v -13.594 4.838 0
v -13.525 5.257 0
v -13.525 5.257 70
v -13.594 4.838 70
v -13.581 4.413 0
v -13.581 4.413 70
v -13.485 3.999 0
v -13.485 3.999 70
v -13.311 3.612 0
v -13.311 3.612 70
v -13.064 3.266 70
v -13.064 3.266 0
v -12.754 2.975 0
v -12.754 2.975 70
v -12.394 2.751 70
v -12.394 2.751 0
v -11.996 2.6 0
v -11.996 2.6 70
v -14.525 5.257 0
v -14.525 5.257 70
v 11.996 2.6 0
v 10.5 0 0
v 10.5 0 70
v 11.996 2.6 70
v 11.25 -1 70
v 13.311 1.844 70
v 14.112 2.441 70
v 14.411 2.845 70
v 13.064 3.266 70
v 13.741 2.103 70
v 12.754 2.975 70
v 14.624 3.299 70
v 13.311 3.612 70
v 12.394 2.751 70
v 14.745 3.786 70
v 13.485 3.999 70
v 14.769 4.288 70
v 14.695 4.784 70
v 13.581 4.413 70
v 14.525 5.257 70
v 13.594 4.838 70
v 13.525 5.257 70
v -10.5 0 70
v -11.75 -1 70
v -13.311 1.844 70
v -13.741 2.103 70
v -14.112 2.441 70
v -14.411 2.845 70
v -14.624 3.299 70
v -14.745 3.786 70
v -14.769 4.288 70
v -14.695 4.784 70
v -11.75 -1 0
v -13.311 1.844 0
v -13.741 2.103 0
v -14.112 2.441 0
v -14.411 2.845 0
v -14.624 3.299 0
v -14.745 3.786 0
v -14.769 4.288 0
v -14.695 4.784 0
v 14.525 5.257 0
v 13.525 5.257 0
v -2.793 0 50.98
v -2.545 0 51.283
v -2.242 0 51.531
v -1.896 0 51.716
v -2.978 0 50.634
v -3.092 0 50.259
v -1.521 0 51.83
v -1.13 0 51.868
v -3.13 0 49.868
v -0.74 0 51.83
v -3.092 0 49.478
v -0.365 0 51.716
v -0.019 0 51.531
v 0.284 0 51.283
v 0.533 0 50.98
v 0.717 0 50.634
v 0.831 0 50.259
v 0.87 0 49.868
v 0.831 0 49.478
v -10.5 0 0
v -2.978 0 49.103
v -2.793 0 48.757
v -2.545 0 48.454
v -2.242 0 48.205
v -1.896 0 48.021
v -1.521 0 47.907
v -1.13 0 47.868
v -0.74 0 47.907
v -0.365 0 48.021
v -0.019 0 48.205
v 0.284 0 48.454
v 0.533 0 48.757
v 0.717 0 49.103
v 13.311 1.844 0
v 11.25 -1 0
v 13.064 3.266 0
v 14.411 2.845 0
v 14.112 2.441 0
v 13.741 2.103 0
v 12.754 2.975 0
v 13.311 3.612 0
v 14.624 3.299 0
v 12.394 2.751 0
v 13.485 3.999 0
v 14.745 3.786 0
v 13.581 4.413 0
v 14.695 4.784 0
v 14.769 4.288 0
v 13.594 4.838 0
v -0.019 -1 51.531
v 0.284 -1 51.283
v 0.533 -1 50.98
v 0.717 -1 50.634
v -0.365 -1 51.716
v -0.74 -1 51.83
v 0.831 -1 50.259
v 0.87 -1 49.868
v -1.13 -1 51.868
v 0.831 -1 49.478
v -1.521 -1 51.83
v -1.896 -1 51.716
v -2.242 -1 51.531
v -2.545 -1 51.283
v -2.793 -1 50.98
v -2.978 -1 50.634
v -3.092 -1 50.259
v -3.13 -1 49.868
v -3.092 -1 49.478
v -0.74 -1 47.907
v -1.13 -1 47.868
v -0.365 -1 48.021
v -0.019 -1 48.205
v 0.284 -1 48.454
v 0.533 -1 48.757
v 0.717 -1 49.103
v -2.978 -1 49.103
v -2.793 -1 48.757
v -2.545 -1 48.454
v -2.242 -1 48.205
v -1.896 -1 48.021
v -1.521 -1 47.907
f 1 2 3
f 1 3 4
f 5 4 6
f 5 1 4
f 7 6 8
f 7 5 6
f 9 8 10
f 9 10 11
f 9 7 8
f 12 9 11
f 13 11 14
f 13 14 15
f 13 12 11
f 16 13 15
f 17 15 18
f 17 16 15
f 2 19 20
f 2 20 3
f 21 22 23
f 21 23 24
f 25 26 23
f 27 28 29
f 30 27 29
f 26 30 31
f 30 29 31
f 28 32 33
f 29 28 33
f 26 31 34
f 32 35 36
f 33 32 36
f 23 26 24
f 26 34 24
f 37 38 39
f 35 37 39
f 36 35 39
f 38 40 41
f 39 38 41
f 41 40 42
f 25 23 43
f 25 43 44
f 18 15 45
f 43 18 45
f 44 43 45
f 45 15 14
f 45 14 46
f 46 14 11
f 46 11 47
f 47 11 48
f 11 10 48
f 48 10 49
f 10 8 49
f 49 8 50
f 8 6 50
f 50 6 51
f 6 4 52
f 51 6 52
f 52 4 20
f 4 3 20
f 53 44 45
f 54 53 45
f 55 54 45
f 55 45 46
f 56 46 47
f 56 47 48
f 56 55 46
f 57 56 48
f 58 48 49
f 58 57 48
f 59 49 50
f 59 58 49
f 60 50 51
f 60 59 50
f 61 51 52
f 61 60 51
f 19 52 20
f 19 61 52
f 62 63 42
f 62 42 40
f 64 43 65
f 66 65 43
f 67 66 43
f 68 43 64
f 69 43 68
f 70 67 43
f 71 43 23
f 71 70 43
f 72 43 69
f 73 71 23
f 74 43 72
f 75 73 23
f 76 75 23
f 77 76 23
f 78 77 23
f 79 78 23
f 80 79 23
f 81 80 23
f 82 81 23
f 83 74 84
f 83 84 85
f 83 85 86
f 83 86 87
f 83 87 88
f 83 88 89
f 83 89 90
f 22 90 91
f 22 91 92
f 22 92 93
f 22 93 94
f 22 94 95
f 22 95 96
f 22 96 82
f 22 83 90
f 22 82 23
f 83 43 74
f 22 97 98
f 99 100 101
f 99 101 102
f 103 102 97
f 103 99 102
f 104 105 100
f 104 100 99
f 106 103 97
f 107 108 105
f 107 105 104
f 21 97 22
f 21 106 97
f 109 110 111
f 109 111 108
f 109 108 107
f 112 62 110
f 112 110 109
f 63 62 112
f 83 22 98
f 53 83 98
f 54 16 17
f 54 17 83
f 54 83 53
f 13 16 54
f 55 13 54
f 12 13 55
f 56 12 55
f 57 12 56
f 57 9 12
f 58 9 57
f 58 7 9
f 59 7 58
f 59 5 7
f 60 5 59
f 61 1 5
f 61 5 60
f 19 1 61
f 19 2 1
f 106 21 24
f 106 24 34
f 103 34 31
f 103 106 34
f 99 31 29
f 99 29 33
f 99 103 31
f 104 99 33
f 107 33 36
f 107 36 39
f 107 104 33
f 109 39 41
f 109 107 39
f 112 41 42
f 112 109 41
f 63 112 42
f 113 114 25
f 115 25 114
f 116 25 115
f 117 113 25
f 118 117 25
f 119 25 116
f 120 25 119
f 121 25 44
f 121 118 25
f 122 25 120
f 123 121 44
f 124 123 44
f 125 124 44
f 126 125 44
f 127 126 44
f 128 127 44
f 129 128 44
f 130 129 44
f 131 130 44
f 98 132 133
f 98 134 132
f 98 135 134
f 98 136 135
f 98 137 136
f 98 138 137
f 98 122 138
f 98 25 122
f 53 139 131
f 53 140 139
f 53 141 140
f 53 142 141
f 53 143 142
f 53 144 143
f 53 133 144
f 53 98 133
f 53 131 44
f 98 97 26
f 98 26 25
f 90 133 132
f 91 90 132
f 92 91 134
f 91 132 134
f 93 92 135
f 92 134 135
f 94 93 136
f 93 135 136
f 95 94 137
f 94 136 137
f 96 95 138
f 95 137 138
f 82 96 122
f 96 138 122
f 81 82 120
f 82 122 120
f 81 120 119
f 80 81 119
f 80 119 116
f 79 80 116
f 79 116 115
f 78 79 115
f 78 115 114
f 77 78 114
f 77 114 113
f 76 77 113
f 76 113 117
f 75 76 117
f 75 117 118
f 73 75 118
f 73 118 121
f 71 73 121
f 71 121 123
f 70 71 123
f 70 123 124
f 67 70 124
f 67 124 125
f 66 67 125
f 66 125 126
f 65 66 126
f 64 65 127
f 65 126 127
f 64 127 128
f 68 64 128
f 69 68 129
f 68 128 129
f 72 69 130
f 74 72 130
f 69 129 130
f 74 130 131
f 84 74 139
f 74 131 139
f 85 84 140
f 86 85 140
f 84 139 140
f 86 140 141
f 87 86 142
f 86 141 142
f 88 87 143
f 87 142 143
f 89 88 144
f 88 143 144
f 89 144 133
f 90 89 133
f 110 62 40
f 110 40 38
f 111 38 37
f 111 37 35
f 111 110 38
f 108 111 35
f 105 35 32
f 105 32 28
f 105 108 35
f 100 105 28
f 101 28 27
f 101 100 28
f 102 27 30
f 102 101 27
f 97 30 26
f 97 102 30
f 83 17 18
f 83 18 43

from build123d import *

# Parameters (mm, degrees)
BOSS_EXTRU_1_DEPTH = 70
SKETCH1_R          = 2
CUT_EXTRUDE1_DEPTH = 10


with BuildPart() as part:
    # Esquisse1 → Boss.-Extru.1 (new body)
    with BuildSketch(Plane.XY):
        with BuildLine():
            Line((-10.5, 0), (10.5, 0))
            Line((10.5, 0), (11.996134815, 2.600303947))
            ThreePointArc((11.996134815, 2.600303947), (13.310550199, 3.611999394), (13.524605519, 5.256808137))
            Line((13.524605519, 5.256808137), (14.524605519, 5.256808137))
            ThreePointArc((14.524605519, 5.256808137), (14.624387393, 3.298979885), (13.310550199, 1.844029812))
            Line((13.310550199, 1.844029812), (11.249883314, -1))
            Line((11.249883314, -1), (-11.750116686, -1))
            Line((-11.750116686, -1), (-13.310550199, 1.844029812))
            ThreePointArc((-13.310550199, 1.844029812), (-14.624387393, 3.298979885), (-14.524605519, 5.256808137))
            Line((-14.524605519, 5.256808137), (-13.524605519, 5.256808137))
            ThreePointArc((-13.524605519, 5.256808137), (-13.310550199, 3.611999394), (-11.996134815, 2.600303947))
            Line((-11.996134815, 2.600303947), (-10.5, 0))
        make_face()
    extrude(amount=BOSS_EXTRU_1_DEPTH)

    # Sketch1 → Cut-Extrude1 (cut)
    with BuildSketch(Plane.XZ.offset(1)):
        with Locations(Location((-1.130377356, 49.868372079, 0), (0, 0, 270))):
            Circle(SKETCH1_R)
    extrude(amount=-CUT_EXTRUDE1_DEPTH, mode=Mode.SUBTRACT)


solid = part.part
